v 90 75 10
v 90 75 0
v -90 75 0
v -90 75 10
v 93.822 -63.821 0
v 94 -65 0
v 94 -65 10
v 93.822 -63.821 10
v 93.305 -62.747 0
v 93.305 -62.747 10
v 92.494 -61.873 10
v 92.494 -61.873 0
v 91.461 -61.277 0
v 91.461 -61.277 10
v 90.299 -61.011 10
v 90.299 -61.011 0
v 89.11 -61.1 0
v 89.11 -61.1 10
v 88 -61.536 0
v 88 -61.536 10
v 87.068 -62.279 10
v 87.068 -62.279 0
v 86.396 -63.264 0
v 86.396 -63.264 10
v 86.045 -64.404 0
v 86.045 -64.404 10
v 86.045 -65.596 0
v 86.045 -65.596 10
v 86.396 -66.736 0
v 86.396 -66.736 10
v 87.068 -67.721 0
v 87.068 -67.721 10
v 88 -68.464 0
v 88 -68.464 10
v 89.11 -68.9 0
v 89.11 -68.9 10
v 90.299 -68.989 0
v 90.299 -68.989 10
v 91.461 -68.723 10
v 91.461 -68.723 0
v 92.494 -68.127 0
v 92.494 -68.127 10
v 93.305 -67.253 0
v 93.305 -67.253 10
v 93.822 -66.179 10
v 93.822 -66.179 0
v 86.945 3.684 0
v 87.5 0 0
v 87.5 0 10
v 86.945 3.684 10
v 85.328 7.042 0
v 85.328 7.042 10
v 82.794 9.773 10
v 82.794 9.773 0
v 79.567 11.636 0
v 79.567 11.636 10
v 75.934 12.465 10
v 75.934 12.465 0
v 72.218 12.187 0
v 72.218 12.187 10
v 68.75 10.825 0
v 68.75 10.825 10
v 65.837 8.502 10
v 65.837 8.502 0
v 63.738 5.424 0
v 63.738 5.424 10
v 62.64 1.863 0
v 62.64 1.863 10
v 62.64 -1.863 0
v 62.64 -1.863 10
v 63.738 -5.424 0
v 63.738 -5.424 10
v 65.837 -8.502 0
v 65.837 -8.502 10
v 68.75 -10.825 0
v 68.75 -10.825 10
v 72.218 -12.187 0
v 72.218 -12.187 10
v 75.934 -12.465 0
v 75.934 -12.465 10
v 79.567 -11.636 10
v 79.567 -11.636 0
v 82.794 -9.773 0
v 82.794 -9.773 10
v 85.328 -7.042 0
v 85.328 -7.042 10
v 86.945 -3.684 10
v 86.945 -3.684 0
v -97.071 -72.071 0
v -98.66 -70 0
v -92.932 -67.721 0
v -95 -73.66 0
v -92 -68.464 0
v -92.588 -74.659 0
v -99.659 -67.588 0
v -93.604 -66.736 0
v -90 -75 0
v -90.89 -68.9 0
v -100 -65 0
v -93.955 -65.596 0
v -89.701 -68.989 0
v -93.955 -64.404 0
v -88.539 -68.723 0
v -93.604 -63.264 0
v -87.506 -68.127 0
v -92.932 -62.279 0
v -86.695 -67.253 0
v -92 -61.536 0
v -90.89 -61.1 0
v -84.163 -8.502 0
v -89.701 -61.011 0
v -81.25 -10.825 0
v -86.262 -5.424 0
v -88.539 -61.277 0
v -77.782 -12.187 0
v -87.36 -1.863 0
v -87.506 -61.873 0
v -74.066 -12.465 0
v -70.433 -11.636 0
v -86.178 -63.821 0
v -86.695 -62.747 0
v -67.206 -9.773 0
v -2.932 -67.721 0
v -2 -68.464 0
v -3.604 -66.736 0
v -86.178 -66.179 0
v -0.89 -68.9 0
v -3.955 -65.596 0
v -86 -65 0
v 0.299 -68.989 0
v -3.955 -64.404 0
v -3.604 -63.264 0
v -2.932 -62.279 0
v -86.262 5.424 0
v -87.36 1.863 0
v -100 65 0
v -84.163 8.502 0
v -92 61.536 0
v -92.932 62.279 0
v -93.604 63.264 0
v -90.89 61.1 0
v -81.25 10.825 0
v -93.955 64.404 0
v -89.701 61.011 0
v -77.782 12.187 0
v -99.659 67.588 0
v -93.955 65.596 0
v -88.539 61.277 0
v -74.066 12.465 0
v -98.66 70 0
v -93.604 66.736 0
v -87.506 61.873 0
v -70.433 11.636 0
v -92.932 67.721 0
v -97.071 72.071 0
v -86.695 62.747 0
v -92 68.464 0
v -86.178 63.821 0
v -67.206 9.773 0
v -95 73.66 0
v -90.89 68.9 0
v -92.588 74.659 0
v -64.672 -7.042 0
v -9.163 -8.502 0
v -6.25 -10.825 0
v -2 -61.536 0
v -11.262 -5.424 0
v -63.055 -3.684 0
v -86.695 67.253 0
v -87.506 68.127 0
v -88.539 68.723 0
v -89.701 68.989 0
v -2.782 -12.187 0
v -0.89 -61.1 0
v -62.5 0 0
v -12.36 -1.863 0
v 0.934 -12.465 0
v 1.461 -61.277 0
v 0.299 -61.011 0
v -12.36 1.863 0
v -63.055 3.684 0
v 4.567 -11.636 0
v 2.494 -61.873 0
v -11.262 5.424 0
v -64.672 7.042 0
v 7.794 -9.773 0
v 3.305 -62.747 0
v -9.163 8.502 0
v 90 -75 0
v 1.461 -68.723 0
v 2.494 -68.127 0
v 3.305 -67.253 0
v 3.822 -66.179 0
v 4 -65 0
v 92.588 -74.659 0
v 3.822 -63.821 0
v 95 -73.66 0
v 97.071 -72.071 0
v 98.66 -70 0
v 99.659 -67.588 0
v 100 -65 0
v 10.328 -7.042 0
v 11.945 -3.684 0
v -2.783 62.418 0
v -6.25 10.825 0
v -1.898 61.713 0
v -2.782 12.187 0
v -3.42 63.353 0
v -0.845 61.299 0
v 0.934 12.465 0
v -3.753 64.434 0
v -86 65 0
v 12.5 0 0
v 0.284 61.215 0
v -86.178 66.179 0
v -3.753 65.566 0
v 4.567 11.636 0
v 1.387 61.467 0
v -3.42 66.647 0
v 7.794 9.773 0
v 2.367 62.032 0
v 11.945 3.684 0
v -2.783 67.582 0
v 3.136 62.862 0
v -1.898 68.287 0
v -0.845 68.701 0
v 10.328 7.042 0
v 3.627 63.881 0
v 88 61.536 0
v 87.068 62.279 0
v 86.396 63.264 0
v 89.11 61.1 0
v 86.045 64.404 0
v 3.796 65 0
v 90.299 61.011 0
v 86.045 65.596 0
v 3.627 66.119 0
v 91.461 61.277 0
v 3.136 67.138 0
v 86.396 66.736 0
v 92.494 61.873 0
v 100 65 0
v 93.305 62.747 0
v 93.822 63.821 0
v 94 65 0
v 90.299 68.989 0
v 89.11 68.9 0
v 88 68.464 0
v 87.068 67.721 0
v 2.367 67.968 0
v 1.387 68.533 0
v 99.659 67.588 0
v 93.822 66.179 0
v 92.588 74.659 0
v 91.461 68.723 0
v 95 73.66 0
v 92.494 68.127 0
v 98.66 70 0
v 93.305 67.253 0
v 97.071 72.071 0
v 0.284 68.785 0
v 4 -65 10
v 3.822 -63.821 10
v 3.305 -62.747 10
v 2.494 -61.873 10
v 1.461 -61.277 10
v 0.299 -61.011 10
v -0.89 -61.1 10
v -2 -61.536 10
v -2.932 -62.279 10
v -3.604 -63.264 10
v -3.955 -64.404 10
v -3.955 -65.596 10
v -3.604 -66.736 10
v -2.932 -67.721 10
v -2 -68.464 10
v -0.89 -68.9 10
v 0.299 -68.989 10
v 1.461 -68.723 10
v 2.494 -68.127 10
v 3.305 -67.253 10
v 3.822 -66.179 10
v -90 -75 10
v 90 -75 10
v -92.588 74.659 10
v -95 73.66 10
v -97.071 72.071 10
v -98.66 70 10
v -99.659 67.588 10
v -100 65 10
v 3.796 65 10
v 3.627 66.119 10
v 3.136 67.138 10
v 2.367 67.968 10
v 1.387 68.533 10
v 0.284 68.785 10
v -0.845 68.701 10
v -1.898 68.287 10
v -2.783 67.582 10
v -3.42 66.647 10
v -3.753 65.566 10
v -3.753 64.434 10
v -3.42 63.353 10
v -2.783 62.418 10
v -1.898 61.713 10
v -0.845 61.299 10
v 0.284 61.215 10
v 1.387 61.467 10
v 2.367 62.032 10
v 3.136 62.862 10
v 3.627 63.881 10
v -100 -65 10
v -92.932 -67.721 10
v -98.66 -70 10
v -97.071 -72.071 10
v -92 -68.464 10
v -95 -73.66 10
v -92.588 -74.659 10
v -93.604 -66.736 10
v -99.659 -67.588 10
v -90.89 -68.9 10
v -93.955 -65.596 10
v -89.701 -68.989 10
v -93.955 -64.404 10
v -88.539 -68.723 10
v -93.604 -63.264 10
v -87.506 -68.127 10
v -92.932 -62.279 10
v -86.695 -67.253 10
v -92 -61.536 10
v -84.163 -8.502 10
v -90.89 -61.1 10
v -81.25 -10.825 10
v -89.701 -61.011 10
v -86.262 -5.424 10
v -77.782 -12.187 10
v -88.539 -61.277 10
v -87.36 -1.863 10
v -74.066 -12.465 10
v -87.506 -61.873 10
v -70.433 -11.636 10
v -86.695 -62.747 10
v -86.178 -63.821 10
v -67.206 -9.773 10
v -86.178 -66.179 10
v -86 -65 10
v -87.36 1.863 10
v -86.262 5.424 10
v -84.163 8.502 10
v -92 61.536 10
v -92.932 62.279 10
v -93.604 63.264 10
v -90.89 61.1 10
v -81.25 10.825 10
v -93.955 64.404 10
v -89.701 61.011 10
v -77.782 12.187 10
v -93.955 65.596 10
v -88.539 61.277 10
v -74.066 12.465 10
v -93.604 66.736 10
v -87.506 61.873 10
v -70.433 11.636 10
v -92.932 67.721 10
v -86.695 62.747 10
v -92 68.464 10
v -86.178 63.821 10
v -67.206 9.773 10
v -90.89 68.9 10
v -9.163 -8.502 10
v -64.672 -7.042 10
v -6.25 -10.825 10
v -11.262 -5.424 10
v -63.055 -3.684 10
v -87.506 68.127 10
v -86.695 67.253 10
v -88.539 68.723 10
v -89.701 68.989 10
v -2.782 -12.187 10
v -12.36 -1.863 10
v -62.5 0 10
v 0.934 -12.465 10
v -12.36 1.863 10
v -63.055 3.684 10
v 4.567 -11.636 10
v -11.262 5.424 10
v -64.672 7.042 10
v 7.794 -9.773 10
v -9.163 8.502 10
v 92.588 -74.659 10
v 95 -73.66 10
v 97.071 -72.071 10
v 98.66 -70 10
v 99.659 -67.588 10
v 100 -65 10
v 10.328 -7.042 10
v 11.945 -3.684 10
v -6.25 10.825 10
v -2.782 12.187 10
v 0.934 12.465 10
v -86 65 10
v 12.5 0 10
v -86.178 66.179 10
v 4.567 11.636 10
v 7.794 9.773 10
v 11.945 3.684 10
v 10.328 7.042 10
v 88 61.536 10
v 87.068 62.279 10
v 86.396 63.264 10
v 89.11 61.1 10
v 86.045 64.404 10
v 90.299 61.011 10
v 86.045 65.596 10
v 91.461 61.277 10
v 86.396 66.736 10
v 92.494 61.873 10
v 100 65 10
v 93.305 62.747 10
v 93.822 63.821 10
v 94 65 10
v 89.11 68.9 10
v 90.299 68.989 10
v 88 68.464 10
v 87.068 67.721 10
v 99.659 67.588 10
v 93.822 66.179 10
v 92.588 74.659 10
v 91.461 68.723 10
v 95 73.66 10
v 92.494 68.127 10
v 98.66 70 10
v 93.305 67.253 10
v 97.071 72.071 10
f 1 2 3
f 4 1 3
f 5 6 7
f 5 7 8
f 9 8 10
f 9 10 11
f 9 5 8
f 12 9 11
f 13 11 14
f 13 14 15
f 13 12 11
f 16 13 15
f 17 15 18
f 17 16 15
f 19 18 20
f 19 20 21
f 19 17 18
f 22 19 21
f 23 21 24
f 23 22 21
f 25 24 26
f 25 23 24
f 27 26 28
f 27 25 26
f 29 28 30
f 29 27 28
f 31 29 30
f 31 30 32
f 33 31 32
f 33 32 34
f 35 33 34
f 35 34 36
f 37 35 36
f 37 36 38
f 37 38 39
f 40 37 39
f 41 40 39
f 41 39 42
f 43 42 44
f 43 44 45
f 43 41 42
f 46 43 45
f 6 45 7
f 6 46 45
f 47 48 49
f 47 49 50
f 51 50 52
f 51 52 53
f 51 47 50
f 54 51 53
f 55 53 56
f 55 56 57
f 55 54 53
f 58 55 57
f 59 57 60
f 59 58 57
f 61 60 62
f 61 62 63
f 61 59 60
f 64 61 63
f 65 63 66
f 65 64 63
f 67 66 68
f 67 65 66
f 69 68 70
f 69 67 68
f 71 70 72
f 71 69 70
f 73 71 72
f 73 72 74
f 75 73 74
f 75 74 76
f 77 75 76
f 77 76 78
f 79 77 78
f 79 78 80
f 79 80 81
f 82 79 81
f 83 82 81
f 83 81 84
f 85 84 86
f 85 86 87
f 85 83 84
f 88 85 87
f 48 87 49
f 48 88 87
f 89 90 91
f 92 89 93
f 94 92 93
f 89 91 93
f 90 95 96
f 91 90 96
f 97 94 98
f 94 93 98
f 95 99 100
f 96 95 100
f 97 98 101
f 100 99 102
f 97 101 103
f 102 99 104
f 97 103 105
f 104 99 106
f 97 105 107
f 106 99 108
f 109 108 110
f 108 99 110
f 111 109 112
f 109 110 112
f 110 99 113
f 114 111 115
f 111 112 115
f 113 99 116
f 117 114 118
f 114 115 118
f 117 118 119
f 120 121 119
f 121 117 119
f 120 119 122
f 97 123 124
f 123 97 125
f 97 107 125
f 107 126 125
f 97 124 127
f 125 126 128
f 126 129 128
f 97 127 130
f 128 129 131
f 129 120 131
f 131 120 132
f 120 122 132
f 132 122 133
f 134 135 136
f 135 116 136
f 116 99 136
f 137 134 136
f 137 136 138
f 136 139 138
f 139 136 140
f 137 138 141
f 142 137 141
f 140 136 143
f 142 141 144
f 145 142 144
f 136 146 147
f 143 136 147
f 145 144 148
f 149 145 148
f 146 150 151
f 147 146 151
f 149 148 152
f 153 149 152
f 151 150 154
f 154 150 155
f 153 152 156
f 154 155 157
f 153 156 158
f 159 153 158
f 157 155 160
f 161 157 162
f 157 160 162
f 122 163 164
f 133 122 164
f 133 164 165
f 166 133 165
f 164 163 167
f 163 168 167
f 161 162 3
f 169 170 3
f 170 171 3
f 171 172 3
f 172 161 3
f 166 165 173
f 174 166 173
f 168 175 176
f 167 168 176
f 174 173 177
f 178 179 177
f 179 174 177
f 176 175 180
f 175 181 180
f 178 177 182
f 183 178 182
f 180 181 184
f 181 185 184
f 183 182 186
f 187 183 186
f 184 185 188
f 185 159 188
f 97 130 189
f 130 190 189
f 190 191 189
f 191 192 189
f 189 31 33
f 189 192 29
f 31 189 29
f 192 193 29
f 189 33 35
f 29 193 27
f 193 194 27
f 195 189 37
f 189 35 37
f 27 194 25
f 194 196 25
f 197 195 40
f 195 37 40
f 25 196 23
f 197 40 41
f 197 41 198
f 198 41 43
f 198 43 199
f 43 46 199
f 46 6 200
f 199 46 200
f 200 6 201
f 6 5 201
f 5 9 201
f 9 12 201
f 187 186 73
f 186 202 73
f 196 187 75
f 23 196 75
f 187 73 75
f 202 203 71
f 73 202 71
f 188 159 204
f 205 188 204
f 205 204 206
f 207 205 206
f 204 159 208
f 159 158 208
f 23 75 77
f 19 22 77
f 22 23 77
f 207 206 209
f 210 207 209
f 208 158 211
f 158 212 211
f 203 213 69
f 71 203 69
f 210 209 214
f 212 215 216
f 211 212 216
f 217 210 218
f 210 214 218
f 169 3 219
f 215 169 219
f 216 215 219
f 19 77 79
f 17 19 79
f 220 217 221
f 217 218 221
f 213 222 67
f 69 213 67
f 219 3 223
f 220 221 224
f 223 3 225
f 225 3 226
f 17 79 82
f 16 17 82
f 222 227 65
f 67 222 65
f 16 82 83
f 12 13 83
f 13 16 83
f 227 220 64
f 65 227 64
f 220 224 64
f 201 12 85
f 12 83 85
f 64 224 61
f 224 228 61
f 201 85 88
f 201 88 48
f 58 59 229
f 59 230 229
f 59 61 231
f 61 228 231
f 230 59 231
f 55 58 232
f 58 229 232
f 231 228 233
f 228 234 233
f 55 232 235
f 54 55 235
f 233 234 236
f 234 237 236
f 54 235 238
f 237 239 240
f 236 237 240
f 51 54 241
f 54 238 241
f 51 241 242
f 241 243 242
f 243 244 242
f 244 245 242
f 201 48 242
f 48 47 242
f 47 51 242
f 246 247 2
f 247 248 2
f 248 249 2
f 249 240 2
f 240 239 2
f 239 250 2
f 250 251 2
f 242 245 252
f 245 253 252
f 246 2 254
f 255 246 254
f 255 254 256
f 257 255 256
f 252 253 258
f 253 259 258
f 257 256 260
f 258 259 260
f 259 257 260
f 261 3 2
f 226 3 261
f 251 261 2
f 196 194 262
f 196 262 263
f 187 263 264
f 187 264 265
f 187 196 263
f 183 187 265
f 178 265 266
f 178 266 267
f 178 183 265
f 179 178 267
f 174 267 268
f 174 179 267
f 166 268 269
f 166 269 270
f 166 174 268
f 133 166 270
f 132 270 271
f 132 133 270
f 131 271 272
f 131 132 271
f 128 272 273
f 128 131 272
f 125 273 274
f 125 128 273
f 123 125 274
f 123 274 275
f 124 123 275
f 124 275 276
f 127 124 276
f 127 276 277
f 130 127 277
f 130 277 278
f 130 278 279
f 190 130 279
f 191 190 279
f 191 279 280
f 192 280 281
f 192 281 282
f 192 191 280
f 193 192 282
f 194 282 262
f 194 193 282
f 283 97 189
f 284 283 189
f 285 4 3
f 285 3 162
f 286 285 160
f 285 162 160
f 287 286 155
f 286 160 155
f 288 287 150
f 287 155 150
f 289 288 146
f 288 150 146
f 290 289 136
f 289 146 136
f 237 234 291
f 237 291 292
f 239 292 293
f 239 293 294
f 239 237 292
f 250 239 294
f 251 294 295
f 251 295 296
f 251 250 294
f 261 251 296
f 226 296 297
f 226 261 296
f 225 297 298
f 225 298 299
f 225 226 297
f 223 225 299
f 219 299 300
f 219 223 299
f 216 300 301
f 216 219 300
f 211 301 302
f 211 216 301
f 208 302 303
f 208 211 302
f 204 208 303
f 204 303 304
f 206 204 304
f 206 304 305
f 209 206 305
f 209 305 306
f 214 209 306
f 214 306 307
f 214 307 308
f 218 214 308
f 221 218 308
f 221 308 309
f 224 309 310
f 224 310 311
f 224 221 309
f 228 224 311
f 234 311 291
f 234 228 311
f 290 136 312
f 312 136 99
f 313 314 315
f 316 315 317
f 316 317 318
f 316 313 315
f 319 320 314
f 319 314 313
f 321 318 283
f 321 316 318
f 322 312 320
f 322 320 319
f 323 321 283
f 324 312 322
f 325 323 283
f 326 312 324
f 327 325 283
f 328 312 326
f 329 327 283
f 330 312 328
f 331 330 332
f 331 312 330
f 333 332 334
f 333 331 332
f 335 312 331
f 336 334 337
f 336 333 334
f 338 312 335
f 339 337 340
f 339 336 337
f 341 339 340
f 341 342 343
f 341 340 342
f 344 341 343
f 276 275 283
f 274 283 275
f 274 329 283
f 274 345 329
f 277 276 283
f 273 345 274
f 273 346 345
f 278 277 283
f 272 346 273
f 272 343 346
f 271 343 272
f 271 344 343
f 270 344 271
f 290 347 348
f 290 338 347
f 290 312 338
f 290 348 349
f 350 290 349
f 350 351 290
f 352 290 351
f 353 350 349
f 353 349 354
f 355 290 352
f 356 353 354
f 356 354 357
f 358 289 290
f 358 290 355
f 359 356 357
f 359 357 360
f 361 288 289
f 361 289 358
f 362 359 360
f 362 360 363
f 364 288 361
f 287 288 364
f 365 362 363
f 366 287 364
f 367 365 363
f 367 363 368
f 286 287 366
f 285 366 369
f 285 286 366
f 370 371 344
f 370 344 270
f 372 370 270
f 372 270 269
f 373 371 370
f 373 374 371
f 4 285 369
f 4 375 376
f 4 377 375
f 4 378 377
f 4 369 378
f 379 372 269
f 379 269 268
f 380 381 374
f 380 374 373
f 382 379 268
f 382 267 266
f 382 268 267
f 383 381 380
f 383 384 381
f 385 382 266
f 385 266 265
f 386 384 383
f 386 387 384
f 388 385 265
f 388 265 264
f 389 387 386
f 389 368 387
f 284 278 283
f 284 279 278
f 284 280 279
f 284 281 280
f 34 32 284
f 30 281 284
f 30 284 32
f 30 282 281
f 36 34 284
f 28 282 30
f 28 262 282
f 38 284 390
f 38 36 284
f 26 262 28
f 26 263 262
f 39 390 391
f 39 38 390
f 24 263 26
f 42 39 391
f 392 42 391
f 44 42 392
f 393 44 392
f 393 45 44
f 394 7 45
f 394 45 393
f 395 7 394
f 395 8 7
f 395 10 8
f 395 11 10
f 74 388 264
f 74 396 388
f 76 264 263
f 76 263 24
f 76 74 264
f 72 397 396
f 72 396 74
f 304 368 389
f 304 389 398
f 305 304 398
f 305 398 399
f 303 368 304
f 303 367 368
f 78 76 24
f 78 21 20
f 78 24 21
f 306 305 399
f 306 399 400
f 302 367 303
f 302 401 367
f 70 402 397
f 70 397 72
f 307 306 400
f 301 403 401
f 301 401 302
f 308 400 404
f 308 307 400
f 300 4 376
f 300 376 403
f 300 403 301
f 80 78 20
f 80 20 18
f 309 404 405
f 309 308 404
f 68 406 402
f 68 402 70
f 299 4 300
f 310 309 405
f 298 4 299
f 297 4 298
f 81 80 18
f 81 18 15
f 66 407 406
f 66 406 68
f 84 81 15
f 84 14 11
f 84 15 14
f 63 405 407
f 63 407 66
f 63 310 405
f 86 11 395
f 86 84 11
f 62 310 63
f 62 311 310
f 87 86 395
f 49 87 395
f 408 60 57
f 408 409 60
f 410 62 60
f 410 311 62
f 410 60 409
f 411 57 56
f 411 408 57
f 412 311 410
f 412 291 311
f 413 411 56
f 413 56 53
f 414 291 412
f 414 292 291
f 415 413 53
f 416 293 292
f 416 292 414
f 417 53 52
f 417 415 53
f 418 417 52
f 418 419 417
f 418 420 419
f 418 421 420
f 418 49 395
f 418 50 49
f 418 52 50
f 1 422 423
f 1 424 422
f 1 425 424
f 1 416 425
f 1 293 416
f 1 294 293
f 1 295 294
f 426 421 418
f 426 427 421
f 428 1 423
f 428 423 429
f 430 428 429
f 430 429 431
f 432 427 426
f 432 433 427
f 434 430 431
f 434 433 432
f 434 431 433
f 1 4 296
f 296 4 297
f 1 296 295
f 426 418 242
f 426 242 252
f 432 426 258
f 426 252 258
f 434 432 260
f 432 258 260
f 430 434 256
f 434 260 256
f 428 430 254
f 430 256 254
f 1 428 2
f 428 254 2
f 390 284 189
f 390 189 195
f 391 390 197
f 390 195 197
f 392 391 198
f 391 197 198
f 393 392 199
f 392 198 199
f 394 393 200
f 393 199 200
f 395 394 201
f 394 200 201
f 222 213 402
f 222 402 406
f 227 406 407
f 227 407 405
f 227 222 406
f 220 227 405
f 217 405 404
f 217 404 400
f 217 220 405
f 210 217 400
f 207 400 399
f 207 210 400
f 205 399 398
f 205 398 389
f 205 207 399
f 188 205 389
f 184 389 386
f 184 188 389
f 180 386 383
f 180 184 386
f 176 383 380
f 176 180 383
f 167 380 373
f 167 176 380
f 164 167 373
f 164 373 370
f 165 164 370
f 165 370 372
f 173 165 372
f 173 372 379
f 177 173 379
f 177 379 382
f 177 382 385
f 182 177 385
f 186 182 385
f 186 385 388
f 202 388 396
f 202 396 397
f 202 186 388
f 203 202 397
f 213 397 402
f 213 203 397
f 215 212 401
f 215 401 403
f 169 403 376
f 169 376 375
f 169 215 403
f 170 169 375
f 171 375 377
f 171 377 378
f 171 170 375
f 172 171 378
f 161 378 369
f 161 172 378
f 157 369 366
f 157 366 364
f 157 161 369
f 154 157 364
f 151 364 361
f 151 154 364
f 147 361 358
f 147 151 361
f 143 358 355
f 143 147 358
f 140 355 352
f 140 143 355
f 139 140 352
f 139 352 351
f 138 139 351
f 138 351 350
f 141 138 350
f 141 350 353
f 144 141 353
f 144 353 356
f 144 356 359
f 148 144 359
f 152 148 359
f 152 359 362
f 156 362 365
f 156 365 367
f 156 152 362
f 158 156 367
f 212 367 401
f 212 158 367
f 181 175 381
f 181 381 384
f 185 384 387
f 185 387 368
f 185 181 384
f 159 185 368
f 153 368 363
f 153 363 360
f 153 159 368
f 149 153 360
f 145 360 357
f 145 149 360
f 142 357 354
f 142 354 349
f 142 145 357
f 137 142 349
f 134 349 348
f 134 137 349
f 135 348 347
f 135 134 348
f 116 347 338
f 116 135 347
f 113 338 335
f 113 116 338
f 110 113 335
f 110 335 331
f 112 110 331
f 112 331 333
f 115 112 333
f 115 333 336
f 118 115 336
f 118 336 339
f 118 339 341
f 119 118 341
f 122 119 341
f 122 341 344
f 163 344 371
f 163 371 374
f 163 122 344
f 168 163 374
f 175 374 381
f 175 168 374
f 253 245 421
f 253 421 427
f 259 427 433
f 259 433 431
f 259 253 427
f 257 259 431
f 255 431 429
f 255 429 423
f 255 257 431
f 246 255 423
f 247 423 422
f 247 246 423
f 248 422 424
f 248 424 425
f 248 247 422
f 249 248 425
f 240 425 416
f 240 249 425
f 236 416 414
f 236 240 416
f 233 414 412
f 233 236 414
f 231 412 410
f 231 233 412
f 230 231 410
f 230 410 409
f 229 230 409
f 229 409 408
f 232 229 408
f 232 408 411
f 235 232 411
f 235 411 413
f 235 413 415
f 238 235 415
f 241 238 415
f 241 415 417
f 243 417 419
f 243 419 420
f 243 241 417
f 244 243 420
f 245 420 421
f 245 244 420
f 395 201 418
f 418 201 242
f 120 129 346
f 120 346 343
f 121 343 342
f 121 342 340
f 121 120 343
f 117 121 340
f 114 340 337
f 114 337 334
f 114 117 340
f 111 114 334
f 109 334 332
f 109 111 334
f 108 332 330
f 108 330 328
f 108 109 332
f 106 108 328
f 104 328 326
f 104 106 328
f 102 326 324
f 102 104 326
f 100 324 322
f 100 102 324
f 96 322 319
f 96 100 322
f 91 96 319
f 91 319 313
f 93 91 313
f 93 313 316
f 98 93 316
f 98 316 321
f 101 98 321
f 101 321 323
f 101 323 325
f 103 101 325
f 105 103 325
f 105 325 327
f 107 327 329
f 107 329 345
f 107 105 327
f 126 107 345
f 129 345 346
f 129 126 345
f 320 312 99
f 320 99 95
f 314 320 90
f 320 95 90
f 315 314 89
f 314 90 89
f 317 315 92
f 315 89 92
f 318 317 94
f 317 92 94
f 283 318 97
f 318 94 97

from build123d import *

# Parameters (mm, degrees)
F0_R     = 4
F0_R_2   = 12.5
F0_R_3   = 3.795856
F1_DEPTH = 10


with BuildPart() as f1:
    # F0 (on Top) → F1 (new body)
    with BuildSketch(Plane.XY):
        with BuildLine():
            ThreePointArc((100, 65), (97.071068, 72.071068), (90, 75))
            Line((90, 75), (-90, 75))
            ThreePointArc((-90, 75), (-97.071068, 72.071068), (-100, 65))
            Line((-100, 65), (-100, -65))
            ThreePointArc((-100, -65), (-97.071068, -72.071068), (-90, -75))
            Line((-90, -75), (90, -75))
            ThreePointArc((90, -75), (97.071068, -72.071068), (100, -65))
            Line((100, -65), (100, 65))
        make_face()
        with Locations((-90, -65)):
            Circle(F0_R, mode=Mode.SUBTRACT)
        with Locations((0, -65)):
            Circle(F0_R, mode=Mode.SUBTRACT)
        with Locations((90, -65)):
            Circle(F0_R, mode=Mode.SUBTRACT)
        with Locations((-75, 0)):
            Circle(F0_R_2, mode=Mode.SUBTRACT)
        with Locations((-90, 65)):
            Circle(F0_R, mode=Mode.SUBTRACT)
        Circle(F0_R_2, mode=Mode.SUBTRACT)
        with Locations((75, 0)):
            Circle(F0_R_2, mode=Mode.SUBTRACT)
        with Locations((0, 65)):
            Circle(F0_R_3, mode=Mode.SUBTRACT)
        with Locations((90, 65)):
            Circle(F0_R, mode=Mode.SUBTRACT)
    extrude(amount=F1_DEPTH)


solid = f1.part
